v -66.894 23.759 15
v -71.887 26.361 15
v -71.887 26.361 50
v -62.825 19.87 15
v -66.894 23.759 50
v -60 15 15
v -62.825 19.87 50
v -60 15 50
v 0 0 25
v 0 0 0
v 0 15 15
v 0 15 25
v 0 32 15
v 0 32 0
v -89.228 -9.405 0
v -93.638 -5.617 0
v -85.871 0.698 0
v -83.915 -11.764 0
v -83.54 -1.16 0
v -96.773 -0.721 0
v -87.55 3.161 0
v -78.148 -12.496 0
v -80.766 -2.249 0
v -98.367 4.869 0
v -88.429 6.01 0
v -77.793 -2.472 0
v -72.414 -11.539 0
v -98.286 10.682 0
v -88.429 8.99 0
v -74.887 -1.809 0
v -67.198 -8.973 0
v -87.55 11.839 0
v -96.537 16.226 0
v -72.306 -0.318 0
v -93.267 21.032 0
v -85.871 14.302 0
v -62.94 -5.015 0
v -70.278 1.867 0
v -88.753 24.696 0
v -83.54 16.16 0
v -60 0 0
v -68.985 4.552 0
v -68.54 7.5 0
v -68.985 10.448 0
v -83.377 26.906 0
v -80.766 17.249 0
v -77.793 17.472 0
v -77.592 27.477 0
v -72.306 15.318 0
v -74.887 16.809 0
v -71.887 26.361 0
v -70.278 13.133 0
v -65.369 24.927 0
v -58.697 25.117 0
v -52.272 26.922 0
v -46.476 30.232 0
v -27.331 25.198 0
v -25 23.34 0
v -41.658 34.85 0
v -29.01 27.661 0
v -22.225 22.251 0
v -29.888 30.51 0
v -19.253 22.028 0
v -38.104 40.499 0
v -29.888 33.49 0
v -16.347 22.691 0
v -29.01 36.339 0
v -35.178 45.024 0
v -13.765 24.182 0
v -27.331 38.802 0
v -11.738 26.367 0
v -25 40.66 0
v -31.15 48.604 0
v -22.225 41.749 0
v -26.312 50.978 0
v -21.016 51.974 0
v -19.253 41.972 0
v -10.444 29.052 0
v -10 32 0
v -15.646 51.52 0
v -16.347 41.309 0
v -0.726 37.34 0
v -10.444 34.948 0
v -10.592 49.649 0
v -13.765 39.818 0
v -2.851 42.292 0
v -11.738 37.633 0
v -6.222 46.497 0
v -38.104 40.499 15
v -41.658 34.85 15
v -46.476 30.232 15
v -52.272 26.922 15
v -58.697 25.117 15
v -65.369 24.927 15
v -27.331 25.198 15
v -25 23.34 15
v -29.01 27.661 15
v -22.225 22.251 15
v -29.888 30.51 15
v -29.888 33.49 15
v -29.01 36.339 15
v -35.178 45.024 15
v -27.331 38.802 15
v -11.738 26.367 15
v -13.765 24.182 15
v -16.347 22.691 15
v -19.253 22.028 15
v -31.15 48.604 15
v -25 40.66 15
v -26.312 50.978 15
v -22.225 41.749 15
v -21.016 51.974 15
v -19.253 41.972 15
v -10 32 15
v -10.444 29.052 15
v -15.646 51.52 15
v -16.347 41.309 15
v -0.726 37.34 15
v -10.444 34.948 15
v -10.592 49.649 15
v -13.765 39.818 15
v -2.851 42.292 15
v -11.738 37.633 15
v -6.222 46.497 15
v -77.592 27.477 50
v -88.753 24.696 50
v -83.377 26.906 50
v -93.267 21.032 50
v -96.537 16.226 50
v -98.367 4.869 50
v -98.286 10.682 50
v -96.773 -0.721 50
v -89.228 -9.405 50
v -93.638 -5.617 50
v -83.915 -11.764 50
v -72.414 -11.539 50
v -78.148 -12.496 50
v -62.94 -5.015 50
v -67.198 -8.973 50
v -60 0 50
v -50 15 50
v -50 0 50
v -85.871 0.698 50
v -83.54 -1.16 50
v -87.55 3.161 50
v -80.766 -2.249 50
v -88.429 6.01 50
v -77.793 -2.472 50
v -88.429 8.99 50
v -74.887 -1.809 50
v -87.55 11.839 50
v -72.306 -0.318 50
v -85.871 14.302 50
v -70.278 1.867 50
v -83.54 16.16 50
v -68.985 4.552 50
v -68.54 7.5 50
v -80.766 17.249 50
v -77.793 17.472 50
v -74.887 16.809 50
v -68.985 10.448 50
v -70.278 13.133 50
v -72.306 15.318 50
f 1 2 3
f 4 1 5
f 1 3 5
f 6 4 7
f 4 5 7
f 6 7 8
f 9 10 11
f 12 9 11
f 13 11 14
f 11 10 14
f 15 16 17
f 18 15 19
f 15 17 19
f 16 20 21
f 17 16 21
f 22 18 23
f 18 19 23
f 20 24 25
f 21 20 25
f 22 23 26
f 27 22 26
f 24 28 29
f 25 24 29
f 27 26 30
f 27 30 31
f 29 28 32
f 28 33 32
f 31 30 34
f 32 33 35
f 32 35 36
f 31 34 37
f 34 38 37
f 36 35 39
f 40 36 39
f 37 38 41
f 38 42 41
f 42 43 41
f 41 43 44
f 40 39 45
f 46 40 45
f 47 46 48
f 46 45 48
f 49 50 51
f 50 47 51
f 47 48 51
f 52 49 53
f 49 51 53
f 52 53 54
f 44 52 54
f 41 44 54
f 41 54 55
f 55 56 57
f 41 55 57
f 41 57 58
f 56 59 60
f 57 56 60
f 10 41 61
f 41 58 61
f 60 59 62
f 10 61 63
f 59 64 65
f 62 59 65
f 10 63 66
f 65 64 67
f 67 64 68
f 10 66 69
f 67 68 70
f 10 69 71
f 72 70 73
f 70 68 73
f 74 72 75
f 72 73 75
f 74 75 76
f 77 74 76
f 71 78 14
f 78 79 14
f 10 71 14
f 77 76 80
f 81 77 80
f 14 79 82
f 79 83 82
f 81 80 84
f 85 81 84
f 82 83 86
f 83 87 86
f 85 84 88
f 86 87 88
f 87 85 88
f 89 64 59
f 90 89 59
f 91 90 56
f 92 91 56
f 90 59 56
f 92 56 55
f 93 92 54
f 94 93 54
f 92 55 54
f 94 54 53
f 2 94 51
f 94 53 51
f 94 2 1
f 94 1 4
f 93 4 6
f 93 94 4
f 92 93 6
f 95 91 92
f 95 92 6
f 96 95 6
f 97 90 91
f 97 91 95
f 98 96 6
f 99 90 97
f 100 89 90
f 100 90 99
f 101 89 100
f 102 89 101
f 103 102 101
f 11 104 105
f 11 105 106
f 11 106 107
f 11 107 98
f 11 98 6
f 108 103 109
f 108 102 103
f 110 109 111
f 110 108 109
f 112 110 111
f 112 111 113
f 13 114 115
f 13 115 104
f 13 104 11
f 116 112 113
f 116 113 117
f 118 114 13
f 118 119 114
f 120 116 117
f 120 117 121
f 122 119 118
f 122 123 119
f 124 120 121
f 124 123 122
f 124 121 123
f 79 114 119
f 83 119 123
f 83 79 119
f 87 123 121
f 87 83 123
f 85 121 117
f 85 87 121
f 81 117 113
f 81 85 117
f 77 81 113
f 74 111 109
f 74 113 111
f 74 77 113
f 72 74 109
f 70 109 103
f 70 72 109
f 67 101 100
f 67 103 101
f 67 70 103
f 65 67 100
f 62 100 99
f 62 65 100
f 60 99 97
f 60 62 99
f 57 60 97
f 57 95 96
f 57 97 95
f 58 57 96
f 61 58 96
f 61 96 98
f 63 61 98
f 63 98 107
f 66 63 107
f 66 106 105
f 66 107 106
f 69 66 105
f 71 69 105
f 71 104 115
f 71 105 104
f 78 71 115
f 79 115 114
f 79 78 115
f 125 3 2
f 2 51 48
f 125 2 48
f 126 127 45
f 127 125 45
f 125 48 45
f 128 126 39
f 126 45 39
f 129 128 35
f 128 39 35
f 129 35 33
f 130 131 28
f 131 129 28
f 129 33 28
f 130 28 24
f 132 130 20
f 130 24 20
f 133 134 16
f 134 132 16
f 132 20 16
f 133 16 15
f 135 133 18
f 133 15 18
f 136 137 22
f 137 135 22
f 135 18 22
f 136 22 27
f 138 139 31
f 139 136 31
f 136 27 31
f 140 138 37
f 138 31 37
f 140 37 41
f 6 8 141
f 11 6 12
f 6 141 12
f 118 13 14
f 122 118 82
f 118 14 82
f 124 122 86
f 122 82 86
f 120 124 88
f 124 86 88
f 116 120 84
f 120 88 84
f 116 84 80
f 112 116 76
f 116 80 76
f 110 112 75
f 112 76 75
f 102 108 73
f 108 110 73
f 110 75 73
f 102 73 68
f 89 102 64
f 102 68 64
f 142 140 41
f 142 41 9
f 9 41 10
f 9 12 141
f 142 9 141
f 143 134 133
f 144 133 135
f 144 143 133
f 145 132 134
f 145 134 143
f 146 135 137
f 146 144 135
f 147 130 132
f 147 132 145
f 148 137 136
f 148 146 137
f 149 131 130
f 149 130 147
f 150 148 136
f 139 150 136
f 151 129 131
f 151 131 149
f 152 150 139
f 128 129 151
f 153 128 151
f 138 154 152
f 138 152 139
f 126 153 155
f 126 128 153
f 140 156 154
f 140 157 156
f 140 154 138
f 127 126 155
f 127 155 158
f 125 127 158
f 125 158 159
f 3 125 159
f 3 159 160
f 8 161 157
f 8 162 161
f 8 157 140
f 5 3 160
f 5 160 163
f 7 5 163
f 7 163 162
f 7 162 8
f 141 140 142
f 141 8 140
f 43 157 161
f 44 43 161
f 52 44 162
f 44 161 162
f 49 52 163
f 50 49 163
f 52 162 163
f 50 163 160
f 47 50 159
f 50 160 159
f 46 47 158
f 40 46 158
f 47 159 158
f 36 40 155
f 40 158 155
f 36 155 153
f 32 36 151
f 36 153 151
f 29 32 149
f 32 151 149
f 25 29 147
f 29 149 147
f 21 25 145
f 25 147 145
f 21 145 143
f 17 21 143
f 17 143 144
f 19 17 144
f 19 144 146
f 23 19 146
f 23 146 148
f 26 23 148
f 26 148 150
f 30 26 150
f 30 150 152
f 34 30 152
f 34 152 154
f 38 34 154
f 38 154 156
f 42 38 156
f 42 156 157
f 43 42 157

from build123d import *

# Parameters (mm, degrees)
F0_R     = 10
F1_DEPTH = 50
F2_R     = 10
F3_DEPTH = 50.001
F5_DEPTH = 35
F7_DEPTH = 27.501


with BuildPart() as f1:
    # F0 (on Top) → F1 (new body)
    with BuildSketch(Plane.XY):
        with BuildLine():
            Line((-60, 0), (0, 0))
            Line((0, 0), (0, 32))
            ThreePointArc((0, 32), (-15.646012, 51.520317), (-38.104279, 40.499123))
            ThreePointArc((-38.104279, 40.499123), (-52.271806, 26.921947), (-71.886688, 26.360722))
            ThreePointArc((-71.886688, 26.360722), (-96.772615, -0.721304), (-60, 0))
        make_face()
        with Locations((-20, 32)):
            Circle(F0_R, mode=Mode.SUBTRACT)
    extrude(amount=F1_DEPTH)

    # F2 (on face) → F3 (cut, through all)
    with BuildSketch(Plane.XY.offset(50)):
        with Locations((-78.540496, 7.5)):
            Circle(F2_R)
    extrude(amount=-F3_DEPTH, mode=Mode.SUBTRACT)

    # F4 (on face) → F5 (cut)
    with BuildSketch(Plane.XY.offset(50)):
        with BuildLine():
            ThreePointArc((-75.410873, 27.253619), (-66.093154, 23.15451), (-60, 15))
            Line((-60, 15), (0, 15))
            Line((0, 15), (0, 64.447676))
            Line((0, 64.447676), (-75.410873, 64.447676))
            Line((-75.410873, 64.447676), (-75.410873, 27.253619))
        make_face()
    extrude(amount=-F5_DEPTH, mode=Mode.SUBTRACT)

    # F6 (on face) → F7 (cut, through all)
    with BuildSketch(Plane(origin=(0, 15, 0), x_dir=(-1, 0, 0), z_dir=(0, 1, 0))):
        Polygon((0, 50), (0, 25), (50, 50), align=None)
    extrude(amount=-F7_DEPTH, mode=Mode.SUBTRACT)


solid = f1.part
